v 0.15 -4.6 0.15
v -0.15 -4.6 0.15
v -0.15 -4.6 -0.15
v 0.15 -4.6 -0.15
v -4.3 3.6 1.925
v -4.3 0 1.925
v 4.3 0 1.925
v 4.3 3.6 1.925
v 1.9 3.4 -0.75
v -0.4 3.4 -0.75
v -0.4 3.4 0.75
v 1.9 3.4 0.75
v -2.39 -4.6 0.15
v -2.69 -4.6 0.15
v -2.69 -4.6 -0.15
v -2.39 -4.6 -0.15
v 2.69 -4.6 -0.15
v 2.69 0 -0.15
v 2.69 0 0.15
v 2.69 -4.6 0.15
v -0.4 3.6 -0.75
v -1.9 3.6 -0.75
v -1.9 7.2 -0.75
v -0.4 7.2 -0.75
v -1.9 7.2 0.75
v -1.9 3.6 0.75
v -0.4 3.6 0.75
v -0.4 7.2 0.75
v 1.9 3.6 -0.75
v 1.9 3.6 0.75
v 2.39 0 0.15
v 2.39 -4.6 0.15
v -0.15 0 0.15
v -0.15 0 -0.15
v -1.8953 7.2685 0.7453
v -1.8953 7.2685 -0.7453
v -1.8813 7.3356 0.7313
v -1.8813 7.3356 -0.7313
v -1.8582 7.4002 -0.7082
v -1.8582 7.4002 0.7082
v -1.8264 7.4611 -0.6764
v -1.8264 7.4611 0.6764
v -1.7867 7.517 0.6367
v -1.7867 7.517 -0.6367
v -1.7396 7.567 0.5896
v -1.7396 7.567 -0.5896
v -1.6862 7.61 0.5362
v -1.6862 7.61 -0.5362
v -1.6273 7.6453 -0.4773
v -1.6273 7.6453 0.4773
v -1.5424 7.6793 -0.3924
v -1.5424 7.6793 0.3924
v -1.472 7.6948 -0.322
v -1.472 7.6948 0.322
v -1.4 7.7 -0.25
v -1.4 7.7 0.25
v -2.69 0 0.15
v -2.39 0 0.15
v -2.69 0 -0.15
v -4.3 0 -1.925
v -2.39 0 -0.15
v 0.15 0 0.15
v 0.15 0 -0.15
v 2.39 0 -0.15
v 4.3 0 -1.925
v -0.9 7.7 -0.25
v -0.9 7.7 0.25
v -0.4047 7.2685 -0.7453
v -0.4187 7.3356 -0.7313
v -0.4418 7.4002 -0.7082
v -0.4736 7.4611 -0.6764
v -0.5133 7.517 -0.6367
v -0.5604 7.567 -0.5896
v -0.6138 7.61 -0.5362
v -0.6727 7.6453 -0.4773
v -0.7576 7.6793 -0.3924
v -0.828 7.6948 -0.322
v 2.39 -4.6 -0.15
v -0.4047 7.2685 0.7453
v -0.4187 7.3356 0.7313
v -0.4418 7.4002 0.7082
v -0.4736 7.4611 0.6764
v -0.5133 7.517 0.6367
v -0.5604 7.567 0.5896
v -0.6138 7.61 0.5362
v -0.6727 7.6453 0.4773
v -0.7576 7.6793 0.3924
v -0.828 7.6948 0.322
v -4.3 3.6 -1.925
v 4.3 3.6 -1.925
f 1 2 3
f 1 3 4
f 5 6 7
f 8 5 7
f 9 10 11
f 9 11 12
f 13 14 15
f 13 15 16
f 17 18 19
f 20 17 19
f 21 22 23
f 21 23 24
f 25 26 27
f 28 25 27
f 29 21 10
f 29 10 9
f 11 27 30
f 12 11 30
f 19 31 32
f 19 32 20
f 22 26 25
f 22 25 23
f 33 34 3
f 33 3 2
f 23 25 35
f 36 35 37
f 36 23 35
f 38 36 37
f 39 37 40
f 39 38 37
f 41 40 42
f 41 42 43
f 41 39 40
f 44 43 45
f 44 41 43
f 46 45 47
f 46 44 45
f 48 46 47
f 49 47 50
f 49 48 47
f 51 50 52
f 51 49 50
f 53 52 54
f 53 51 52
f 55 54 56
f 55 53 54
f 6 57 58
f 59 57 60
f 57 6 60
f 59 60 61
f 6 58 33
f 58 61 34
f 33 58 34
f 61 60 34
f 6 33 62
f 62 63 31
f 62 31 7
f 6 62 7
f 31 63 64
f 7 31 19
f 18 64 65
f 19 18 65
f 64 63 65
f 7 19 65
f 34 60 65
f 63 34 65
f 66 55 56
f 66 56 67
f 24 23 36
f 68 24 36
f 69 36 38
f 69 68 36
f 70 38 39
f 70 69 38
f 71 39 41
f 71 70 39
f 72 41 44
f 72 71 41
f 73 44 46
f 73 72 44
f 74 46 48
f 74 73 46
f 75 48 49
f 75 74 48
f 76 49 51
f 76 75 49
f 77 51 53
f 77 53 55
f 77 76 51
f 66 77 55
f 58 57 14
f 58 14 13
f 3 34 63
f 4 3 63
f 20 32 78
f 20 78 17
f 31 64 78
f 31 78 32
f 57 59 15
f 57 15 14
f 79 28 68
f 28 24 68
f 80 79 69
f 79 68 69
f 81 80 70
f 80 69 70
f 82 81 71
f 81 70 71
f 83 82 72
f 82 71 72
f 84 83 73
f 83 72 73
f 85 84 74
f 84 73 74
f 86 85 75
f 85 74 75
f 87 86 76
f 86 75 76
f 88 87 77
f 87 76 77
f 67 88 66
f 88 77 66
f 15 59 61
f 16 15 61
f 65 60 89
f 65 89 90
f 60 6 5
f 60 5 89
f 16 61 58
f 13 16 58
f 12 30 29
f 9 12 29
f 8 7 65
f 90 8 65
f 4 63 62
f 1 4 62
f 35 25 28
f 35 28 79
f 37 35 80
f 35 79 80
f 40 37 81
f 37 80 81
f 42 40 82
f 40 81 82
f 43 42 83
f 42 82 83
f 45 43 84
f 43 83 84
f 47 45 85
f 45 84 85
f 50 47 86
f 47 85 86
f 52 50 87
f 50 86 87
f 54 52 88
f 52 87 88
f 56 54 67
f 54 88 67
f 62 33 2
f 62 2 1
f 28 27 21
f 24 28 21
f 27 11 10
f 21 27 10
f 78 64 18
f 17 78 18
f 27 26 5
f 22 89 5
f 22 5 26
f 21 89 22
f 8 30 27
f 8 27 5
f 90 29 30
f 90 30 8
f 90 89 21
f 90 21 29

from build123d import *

# Parameters (mm, degrees)
SKETCH2_W           = 8.6
SKETCH2_H           = 3.85
BOSS_EXTRUDE1_DEPTH = 3.6
SKETCH3_W           = 1.5
SKETCH3_H           = 1.5
BOSS_EXTRUDE2_DEPTH = 4.1
SKETCH4_W           = 2.3
SKETCH4_H           = 1.5
CUT_EXTRUDE1_DEPTH  = 0.2
FILLET1_R           = 0.5
SKETCH5_W           = 0.3
SKETCH5_H           = 0.3
BOSS_EXTRUDE3_DEPTH = 4.6


with BuildPart() as part:
    # Sketch2 → Boss-Extrude1 (new body)
    with BuildSketch(Plane(origin=(0, 0, 0), x_dir=(1, 0, 0), z_dir=(0, 1, 0))):
        Rectangle(SKETCH2_W, SKETCH2_H)
    extrude(amount=BOSS_EXTRUDE1_DEPTH)

    # Sketch3 → Boss-Extrude2 (add)
    with BuildSketch(Plane(origin=(0, 3.6, 0), x_dir=(1, 0, 0), z_dir=(0, 1, 0))):
        with Locations((-1.15, 0)):
            Rectangle(SKETCH3_W, SKETCH3_H)
    extrude(amount=BOSS_EXTRUDE2_DEPTH)

    # Sketch4 → Cut-Extrude1 (cut)
    with BuildSketch(Plane(origin=(0, 3.6, 0), x_dir=(1, 0, 0), z_dir=(0, 1, 0))):
        with Locations((0.75, 0)):
            Rectangle(SKETCH4_W, SKETCH4_H)
    extrude(amount=-CUT_EXTRUDE1_DEPTH, mode=Mode.SUBTRACT)

    # Fillet1
    fillet1_edges = [part.edges().sort_by_distance(p)[0] for p in [
        (-0.4, 7.7, 0),
        (-1.15, 7.7, -0.75),
        (-1.9, 7.7, 0),
        (-1.15, 7.7, 0.75),
    ]]
    fillet(fillet1_edges, radius=FILLET1_R)

    # Sketch5 → Boss-Extrude3 (add)
    with BuildSketch(Plane.XZ):
        Rectangle(SKETCH5_W, SKETCH5_H)
        with Locations((-2.54, 0)):
            Rectangle(SKETCH5_W, SKETCH5_H)
        with Locations((2.54, 0)):
            Rectangle(SKETCH5_W, SKETCH5_H)
    extrude(amount=BOSS_EXTRUDE3_DEPTH)


solid = part.part
